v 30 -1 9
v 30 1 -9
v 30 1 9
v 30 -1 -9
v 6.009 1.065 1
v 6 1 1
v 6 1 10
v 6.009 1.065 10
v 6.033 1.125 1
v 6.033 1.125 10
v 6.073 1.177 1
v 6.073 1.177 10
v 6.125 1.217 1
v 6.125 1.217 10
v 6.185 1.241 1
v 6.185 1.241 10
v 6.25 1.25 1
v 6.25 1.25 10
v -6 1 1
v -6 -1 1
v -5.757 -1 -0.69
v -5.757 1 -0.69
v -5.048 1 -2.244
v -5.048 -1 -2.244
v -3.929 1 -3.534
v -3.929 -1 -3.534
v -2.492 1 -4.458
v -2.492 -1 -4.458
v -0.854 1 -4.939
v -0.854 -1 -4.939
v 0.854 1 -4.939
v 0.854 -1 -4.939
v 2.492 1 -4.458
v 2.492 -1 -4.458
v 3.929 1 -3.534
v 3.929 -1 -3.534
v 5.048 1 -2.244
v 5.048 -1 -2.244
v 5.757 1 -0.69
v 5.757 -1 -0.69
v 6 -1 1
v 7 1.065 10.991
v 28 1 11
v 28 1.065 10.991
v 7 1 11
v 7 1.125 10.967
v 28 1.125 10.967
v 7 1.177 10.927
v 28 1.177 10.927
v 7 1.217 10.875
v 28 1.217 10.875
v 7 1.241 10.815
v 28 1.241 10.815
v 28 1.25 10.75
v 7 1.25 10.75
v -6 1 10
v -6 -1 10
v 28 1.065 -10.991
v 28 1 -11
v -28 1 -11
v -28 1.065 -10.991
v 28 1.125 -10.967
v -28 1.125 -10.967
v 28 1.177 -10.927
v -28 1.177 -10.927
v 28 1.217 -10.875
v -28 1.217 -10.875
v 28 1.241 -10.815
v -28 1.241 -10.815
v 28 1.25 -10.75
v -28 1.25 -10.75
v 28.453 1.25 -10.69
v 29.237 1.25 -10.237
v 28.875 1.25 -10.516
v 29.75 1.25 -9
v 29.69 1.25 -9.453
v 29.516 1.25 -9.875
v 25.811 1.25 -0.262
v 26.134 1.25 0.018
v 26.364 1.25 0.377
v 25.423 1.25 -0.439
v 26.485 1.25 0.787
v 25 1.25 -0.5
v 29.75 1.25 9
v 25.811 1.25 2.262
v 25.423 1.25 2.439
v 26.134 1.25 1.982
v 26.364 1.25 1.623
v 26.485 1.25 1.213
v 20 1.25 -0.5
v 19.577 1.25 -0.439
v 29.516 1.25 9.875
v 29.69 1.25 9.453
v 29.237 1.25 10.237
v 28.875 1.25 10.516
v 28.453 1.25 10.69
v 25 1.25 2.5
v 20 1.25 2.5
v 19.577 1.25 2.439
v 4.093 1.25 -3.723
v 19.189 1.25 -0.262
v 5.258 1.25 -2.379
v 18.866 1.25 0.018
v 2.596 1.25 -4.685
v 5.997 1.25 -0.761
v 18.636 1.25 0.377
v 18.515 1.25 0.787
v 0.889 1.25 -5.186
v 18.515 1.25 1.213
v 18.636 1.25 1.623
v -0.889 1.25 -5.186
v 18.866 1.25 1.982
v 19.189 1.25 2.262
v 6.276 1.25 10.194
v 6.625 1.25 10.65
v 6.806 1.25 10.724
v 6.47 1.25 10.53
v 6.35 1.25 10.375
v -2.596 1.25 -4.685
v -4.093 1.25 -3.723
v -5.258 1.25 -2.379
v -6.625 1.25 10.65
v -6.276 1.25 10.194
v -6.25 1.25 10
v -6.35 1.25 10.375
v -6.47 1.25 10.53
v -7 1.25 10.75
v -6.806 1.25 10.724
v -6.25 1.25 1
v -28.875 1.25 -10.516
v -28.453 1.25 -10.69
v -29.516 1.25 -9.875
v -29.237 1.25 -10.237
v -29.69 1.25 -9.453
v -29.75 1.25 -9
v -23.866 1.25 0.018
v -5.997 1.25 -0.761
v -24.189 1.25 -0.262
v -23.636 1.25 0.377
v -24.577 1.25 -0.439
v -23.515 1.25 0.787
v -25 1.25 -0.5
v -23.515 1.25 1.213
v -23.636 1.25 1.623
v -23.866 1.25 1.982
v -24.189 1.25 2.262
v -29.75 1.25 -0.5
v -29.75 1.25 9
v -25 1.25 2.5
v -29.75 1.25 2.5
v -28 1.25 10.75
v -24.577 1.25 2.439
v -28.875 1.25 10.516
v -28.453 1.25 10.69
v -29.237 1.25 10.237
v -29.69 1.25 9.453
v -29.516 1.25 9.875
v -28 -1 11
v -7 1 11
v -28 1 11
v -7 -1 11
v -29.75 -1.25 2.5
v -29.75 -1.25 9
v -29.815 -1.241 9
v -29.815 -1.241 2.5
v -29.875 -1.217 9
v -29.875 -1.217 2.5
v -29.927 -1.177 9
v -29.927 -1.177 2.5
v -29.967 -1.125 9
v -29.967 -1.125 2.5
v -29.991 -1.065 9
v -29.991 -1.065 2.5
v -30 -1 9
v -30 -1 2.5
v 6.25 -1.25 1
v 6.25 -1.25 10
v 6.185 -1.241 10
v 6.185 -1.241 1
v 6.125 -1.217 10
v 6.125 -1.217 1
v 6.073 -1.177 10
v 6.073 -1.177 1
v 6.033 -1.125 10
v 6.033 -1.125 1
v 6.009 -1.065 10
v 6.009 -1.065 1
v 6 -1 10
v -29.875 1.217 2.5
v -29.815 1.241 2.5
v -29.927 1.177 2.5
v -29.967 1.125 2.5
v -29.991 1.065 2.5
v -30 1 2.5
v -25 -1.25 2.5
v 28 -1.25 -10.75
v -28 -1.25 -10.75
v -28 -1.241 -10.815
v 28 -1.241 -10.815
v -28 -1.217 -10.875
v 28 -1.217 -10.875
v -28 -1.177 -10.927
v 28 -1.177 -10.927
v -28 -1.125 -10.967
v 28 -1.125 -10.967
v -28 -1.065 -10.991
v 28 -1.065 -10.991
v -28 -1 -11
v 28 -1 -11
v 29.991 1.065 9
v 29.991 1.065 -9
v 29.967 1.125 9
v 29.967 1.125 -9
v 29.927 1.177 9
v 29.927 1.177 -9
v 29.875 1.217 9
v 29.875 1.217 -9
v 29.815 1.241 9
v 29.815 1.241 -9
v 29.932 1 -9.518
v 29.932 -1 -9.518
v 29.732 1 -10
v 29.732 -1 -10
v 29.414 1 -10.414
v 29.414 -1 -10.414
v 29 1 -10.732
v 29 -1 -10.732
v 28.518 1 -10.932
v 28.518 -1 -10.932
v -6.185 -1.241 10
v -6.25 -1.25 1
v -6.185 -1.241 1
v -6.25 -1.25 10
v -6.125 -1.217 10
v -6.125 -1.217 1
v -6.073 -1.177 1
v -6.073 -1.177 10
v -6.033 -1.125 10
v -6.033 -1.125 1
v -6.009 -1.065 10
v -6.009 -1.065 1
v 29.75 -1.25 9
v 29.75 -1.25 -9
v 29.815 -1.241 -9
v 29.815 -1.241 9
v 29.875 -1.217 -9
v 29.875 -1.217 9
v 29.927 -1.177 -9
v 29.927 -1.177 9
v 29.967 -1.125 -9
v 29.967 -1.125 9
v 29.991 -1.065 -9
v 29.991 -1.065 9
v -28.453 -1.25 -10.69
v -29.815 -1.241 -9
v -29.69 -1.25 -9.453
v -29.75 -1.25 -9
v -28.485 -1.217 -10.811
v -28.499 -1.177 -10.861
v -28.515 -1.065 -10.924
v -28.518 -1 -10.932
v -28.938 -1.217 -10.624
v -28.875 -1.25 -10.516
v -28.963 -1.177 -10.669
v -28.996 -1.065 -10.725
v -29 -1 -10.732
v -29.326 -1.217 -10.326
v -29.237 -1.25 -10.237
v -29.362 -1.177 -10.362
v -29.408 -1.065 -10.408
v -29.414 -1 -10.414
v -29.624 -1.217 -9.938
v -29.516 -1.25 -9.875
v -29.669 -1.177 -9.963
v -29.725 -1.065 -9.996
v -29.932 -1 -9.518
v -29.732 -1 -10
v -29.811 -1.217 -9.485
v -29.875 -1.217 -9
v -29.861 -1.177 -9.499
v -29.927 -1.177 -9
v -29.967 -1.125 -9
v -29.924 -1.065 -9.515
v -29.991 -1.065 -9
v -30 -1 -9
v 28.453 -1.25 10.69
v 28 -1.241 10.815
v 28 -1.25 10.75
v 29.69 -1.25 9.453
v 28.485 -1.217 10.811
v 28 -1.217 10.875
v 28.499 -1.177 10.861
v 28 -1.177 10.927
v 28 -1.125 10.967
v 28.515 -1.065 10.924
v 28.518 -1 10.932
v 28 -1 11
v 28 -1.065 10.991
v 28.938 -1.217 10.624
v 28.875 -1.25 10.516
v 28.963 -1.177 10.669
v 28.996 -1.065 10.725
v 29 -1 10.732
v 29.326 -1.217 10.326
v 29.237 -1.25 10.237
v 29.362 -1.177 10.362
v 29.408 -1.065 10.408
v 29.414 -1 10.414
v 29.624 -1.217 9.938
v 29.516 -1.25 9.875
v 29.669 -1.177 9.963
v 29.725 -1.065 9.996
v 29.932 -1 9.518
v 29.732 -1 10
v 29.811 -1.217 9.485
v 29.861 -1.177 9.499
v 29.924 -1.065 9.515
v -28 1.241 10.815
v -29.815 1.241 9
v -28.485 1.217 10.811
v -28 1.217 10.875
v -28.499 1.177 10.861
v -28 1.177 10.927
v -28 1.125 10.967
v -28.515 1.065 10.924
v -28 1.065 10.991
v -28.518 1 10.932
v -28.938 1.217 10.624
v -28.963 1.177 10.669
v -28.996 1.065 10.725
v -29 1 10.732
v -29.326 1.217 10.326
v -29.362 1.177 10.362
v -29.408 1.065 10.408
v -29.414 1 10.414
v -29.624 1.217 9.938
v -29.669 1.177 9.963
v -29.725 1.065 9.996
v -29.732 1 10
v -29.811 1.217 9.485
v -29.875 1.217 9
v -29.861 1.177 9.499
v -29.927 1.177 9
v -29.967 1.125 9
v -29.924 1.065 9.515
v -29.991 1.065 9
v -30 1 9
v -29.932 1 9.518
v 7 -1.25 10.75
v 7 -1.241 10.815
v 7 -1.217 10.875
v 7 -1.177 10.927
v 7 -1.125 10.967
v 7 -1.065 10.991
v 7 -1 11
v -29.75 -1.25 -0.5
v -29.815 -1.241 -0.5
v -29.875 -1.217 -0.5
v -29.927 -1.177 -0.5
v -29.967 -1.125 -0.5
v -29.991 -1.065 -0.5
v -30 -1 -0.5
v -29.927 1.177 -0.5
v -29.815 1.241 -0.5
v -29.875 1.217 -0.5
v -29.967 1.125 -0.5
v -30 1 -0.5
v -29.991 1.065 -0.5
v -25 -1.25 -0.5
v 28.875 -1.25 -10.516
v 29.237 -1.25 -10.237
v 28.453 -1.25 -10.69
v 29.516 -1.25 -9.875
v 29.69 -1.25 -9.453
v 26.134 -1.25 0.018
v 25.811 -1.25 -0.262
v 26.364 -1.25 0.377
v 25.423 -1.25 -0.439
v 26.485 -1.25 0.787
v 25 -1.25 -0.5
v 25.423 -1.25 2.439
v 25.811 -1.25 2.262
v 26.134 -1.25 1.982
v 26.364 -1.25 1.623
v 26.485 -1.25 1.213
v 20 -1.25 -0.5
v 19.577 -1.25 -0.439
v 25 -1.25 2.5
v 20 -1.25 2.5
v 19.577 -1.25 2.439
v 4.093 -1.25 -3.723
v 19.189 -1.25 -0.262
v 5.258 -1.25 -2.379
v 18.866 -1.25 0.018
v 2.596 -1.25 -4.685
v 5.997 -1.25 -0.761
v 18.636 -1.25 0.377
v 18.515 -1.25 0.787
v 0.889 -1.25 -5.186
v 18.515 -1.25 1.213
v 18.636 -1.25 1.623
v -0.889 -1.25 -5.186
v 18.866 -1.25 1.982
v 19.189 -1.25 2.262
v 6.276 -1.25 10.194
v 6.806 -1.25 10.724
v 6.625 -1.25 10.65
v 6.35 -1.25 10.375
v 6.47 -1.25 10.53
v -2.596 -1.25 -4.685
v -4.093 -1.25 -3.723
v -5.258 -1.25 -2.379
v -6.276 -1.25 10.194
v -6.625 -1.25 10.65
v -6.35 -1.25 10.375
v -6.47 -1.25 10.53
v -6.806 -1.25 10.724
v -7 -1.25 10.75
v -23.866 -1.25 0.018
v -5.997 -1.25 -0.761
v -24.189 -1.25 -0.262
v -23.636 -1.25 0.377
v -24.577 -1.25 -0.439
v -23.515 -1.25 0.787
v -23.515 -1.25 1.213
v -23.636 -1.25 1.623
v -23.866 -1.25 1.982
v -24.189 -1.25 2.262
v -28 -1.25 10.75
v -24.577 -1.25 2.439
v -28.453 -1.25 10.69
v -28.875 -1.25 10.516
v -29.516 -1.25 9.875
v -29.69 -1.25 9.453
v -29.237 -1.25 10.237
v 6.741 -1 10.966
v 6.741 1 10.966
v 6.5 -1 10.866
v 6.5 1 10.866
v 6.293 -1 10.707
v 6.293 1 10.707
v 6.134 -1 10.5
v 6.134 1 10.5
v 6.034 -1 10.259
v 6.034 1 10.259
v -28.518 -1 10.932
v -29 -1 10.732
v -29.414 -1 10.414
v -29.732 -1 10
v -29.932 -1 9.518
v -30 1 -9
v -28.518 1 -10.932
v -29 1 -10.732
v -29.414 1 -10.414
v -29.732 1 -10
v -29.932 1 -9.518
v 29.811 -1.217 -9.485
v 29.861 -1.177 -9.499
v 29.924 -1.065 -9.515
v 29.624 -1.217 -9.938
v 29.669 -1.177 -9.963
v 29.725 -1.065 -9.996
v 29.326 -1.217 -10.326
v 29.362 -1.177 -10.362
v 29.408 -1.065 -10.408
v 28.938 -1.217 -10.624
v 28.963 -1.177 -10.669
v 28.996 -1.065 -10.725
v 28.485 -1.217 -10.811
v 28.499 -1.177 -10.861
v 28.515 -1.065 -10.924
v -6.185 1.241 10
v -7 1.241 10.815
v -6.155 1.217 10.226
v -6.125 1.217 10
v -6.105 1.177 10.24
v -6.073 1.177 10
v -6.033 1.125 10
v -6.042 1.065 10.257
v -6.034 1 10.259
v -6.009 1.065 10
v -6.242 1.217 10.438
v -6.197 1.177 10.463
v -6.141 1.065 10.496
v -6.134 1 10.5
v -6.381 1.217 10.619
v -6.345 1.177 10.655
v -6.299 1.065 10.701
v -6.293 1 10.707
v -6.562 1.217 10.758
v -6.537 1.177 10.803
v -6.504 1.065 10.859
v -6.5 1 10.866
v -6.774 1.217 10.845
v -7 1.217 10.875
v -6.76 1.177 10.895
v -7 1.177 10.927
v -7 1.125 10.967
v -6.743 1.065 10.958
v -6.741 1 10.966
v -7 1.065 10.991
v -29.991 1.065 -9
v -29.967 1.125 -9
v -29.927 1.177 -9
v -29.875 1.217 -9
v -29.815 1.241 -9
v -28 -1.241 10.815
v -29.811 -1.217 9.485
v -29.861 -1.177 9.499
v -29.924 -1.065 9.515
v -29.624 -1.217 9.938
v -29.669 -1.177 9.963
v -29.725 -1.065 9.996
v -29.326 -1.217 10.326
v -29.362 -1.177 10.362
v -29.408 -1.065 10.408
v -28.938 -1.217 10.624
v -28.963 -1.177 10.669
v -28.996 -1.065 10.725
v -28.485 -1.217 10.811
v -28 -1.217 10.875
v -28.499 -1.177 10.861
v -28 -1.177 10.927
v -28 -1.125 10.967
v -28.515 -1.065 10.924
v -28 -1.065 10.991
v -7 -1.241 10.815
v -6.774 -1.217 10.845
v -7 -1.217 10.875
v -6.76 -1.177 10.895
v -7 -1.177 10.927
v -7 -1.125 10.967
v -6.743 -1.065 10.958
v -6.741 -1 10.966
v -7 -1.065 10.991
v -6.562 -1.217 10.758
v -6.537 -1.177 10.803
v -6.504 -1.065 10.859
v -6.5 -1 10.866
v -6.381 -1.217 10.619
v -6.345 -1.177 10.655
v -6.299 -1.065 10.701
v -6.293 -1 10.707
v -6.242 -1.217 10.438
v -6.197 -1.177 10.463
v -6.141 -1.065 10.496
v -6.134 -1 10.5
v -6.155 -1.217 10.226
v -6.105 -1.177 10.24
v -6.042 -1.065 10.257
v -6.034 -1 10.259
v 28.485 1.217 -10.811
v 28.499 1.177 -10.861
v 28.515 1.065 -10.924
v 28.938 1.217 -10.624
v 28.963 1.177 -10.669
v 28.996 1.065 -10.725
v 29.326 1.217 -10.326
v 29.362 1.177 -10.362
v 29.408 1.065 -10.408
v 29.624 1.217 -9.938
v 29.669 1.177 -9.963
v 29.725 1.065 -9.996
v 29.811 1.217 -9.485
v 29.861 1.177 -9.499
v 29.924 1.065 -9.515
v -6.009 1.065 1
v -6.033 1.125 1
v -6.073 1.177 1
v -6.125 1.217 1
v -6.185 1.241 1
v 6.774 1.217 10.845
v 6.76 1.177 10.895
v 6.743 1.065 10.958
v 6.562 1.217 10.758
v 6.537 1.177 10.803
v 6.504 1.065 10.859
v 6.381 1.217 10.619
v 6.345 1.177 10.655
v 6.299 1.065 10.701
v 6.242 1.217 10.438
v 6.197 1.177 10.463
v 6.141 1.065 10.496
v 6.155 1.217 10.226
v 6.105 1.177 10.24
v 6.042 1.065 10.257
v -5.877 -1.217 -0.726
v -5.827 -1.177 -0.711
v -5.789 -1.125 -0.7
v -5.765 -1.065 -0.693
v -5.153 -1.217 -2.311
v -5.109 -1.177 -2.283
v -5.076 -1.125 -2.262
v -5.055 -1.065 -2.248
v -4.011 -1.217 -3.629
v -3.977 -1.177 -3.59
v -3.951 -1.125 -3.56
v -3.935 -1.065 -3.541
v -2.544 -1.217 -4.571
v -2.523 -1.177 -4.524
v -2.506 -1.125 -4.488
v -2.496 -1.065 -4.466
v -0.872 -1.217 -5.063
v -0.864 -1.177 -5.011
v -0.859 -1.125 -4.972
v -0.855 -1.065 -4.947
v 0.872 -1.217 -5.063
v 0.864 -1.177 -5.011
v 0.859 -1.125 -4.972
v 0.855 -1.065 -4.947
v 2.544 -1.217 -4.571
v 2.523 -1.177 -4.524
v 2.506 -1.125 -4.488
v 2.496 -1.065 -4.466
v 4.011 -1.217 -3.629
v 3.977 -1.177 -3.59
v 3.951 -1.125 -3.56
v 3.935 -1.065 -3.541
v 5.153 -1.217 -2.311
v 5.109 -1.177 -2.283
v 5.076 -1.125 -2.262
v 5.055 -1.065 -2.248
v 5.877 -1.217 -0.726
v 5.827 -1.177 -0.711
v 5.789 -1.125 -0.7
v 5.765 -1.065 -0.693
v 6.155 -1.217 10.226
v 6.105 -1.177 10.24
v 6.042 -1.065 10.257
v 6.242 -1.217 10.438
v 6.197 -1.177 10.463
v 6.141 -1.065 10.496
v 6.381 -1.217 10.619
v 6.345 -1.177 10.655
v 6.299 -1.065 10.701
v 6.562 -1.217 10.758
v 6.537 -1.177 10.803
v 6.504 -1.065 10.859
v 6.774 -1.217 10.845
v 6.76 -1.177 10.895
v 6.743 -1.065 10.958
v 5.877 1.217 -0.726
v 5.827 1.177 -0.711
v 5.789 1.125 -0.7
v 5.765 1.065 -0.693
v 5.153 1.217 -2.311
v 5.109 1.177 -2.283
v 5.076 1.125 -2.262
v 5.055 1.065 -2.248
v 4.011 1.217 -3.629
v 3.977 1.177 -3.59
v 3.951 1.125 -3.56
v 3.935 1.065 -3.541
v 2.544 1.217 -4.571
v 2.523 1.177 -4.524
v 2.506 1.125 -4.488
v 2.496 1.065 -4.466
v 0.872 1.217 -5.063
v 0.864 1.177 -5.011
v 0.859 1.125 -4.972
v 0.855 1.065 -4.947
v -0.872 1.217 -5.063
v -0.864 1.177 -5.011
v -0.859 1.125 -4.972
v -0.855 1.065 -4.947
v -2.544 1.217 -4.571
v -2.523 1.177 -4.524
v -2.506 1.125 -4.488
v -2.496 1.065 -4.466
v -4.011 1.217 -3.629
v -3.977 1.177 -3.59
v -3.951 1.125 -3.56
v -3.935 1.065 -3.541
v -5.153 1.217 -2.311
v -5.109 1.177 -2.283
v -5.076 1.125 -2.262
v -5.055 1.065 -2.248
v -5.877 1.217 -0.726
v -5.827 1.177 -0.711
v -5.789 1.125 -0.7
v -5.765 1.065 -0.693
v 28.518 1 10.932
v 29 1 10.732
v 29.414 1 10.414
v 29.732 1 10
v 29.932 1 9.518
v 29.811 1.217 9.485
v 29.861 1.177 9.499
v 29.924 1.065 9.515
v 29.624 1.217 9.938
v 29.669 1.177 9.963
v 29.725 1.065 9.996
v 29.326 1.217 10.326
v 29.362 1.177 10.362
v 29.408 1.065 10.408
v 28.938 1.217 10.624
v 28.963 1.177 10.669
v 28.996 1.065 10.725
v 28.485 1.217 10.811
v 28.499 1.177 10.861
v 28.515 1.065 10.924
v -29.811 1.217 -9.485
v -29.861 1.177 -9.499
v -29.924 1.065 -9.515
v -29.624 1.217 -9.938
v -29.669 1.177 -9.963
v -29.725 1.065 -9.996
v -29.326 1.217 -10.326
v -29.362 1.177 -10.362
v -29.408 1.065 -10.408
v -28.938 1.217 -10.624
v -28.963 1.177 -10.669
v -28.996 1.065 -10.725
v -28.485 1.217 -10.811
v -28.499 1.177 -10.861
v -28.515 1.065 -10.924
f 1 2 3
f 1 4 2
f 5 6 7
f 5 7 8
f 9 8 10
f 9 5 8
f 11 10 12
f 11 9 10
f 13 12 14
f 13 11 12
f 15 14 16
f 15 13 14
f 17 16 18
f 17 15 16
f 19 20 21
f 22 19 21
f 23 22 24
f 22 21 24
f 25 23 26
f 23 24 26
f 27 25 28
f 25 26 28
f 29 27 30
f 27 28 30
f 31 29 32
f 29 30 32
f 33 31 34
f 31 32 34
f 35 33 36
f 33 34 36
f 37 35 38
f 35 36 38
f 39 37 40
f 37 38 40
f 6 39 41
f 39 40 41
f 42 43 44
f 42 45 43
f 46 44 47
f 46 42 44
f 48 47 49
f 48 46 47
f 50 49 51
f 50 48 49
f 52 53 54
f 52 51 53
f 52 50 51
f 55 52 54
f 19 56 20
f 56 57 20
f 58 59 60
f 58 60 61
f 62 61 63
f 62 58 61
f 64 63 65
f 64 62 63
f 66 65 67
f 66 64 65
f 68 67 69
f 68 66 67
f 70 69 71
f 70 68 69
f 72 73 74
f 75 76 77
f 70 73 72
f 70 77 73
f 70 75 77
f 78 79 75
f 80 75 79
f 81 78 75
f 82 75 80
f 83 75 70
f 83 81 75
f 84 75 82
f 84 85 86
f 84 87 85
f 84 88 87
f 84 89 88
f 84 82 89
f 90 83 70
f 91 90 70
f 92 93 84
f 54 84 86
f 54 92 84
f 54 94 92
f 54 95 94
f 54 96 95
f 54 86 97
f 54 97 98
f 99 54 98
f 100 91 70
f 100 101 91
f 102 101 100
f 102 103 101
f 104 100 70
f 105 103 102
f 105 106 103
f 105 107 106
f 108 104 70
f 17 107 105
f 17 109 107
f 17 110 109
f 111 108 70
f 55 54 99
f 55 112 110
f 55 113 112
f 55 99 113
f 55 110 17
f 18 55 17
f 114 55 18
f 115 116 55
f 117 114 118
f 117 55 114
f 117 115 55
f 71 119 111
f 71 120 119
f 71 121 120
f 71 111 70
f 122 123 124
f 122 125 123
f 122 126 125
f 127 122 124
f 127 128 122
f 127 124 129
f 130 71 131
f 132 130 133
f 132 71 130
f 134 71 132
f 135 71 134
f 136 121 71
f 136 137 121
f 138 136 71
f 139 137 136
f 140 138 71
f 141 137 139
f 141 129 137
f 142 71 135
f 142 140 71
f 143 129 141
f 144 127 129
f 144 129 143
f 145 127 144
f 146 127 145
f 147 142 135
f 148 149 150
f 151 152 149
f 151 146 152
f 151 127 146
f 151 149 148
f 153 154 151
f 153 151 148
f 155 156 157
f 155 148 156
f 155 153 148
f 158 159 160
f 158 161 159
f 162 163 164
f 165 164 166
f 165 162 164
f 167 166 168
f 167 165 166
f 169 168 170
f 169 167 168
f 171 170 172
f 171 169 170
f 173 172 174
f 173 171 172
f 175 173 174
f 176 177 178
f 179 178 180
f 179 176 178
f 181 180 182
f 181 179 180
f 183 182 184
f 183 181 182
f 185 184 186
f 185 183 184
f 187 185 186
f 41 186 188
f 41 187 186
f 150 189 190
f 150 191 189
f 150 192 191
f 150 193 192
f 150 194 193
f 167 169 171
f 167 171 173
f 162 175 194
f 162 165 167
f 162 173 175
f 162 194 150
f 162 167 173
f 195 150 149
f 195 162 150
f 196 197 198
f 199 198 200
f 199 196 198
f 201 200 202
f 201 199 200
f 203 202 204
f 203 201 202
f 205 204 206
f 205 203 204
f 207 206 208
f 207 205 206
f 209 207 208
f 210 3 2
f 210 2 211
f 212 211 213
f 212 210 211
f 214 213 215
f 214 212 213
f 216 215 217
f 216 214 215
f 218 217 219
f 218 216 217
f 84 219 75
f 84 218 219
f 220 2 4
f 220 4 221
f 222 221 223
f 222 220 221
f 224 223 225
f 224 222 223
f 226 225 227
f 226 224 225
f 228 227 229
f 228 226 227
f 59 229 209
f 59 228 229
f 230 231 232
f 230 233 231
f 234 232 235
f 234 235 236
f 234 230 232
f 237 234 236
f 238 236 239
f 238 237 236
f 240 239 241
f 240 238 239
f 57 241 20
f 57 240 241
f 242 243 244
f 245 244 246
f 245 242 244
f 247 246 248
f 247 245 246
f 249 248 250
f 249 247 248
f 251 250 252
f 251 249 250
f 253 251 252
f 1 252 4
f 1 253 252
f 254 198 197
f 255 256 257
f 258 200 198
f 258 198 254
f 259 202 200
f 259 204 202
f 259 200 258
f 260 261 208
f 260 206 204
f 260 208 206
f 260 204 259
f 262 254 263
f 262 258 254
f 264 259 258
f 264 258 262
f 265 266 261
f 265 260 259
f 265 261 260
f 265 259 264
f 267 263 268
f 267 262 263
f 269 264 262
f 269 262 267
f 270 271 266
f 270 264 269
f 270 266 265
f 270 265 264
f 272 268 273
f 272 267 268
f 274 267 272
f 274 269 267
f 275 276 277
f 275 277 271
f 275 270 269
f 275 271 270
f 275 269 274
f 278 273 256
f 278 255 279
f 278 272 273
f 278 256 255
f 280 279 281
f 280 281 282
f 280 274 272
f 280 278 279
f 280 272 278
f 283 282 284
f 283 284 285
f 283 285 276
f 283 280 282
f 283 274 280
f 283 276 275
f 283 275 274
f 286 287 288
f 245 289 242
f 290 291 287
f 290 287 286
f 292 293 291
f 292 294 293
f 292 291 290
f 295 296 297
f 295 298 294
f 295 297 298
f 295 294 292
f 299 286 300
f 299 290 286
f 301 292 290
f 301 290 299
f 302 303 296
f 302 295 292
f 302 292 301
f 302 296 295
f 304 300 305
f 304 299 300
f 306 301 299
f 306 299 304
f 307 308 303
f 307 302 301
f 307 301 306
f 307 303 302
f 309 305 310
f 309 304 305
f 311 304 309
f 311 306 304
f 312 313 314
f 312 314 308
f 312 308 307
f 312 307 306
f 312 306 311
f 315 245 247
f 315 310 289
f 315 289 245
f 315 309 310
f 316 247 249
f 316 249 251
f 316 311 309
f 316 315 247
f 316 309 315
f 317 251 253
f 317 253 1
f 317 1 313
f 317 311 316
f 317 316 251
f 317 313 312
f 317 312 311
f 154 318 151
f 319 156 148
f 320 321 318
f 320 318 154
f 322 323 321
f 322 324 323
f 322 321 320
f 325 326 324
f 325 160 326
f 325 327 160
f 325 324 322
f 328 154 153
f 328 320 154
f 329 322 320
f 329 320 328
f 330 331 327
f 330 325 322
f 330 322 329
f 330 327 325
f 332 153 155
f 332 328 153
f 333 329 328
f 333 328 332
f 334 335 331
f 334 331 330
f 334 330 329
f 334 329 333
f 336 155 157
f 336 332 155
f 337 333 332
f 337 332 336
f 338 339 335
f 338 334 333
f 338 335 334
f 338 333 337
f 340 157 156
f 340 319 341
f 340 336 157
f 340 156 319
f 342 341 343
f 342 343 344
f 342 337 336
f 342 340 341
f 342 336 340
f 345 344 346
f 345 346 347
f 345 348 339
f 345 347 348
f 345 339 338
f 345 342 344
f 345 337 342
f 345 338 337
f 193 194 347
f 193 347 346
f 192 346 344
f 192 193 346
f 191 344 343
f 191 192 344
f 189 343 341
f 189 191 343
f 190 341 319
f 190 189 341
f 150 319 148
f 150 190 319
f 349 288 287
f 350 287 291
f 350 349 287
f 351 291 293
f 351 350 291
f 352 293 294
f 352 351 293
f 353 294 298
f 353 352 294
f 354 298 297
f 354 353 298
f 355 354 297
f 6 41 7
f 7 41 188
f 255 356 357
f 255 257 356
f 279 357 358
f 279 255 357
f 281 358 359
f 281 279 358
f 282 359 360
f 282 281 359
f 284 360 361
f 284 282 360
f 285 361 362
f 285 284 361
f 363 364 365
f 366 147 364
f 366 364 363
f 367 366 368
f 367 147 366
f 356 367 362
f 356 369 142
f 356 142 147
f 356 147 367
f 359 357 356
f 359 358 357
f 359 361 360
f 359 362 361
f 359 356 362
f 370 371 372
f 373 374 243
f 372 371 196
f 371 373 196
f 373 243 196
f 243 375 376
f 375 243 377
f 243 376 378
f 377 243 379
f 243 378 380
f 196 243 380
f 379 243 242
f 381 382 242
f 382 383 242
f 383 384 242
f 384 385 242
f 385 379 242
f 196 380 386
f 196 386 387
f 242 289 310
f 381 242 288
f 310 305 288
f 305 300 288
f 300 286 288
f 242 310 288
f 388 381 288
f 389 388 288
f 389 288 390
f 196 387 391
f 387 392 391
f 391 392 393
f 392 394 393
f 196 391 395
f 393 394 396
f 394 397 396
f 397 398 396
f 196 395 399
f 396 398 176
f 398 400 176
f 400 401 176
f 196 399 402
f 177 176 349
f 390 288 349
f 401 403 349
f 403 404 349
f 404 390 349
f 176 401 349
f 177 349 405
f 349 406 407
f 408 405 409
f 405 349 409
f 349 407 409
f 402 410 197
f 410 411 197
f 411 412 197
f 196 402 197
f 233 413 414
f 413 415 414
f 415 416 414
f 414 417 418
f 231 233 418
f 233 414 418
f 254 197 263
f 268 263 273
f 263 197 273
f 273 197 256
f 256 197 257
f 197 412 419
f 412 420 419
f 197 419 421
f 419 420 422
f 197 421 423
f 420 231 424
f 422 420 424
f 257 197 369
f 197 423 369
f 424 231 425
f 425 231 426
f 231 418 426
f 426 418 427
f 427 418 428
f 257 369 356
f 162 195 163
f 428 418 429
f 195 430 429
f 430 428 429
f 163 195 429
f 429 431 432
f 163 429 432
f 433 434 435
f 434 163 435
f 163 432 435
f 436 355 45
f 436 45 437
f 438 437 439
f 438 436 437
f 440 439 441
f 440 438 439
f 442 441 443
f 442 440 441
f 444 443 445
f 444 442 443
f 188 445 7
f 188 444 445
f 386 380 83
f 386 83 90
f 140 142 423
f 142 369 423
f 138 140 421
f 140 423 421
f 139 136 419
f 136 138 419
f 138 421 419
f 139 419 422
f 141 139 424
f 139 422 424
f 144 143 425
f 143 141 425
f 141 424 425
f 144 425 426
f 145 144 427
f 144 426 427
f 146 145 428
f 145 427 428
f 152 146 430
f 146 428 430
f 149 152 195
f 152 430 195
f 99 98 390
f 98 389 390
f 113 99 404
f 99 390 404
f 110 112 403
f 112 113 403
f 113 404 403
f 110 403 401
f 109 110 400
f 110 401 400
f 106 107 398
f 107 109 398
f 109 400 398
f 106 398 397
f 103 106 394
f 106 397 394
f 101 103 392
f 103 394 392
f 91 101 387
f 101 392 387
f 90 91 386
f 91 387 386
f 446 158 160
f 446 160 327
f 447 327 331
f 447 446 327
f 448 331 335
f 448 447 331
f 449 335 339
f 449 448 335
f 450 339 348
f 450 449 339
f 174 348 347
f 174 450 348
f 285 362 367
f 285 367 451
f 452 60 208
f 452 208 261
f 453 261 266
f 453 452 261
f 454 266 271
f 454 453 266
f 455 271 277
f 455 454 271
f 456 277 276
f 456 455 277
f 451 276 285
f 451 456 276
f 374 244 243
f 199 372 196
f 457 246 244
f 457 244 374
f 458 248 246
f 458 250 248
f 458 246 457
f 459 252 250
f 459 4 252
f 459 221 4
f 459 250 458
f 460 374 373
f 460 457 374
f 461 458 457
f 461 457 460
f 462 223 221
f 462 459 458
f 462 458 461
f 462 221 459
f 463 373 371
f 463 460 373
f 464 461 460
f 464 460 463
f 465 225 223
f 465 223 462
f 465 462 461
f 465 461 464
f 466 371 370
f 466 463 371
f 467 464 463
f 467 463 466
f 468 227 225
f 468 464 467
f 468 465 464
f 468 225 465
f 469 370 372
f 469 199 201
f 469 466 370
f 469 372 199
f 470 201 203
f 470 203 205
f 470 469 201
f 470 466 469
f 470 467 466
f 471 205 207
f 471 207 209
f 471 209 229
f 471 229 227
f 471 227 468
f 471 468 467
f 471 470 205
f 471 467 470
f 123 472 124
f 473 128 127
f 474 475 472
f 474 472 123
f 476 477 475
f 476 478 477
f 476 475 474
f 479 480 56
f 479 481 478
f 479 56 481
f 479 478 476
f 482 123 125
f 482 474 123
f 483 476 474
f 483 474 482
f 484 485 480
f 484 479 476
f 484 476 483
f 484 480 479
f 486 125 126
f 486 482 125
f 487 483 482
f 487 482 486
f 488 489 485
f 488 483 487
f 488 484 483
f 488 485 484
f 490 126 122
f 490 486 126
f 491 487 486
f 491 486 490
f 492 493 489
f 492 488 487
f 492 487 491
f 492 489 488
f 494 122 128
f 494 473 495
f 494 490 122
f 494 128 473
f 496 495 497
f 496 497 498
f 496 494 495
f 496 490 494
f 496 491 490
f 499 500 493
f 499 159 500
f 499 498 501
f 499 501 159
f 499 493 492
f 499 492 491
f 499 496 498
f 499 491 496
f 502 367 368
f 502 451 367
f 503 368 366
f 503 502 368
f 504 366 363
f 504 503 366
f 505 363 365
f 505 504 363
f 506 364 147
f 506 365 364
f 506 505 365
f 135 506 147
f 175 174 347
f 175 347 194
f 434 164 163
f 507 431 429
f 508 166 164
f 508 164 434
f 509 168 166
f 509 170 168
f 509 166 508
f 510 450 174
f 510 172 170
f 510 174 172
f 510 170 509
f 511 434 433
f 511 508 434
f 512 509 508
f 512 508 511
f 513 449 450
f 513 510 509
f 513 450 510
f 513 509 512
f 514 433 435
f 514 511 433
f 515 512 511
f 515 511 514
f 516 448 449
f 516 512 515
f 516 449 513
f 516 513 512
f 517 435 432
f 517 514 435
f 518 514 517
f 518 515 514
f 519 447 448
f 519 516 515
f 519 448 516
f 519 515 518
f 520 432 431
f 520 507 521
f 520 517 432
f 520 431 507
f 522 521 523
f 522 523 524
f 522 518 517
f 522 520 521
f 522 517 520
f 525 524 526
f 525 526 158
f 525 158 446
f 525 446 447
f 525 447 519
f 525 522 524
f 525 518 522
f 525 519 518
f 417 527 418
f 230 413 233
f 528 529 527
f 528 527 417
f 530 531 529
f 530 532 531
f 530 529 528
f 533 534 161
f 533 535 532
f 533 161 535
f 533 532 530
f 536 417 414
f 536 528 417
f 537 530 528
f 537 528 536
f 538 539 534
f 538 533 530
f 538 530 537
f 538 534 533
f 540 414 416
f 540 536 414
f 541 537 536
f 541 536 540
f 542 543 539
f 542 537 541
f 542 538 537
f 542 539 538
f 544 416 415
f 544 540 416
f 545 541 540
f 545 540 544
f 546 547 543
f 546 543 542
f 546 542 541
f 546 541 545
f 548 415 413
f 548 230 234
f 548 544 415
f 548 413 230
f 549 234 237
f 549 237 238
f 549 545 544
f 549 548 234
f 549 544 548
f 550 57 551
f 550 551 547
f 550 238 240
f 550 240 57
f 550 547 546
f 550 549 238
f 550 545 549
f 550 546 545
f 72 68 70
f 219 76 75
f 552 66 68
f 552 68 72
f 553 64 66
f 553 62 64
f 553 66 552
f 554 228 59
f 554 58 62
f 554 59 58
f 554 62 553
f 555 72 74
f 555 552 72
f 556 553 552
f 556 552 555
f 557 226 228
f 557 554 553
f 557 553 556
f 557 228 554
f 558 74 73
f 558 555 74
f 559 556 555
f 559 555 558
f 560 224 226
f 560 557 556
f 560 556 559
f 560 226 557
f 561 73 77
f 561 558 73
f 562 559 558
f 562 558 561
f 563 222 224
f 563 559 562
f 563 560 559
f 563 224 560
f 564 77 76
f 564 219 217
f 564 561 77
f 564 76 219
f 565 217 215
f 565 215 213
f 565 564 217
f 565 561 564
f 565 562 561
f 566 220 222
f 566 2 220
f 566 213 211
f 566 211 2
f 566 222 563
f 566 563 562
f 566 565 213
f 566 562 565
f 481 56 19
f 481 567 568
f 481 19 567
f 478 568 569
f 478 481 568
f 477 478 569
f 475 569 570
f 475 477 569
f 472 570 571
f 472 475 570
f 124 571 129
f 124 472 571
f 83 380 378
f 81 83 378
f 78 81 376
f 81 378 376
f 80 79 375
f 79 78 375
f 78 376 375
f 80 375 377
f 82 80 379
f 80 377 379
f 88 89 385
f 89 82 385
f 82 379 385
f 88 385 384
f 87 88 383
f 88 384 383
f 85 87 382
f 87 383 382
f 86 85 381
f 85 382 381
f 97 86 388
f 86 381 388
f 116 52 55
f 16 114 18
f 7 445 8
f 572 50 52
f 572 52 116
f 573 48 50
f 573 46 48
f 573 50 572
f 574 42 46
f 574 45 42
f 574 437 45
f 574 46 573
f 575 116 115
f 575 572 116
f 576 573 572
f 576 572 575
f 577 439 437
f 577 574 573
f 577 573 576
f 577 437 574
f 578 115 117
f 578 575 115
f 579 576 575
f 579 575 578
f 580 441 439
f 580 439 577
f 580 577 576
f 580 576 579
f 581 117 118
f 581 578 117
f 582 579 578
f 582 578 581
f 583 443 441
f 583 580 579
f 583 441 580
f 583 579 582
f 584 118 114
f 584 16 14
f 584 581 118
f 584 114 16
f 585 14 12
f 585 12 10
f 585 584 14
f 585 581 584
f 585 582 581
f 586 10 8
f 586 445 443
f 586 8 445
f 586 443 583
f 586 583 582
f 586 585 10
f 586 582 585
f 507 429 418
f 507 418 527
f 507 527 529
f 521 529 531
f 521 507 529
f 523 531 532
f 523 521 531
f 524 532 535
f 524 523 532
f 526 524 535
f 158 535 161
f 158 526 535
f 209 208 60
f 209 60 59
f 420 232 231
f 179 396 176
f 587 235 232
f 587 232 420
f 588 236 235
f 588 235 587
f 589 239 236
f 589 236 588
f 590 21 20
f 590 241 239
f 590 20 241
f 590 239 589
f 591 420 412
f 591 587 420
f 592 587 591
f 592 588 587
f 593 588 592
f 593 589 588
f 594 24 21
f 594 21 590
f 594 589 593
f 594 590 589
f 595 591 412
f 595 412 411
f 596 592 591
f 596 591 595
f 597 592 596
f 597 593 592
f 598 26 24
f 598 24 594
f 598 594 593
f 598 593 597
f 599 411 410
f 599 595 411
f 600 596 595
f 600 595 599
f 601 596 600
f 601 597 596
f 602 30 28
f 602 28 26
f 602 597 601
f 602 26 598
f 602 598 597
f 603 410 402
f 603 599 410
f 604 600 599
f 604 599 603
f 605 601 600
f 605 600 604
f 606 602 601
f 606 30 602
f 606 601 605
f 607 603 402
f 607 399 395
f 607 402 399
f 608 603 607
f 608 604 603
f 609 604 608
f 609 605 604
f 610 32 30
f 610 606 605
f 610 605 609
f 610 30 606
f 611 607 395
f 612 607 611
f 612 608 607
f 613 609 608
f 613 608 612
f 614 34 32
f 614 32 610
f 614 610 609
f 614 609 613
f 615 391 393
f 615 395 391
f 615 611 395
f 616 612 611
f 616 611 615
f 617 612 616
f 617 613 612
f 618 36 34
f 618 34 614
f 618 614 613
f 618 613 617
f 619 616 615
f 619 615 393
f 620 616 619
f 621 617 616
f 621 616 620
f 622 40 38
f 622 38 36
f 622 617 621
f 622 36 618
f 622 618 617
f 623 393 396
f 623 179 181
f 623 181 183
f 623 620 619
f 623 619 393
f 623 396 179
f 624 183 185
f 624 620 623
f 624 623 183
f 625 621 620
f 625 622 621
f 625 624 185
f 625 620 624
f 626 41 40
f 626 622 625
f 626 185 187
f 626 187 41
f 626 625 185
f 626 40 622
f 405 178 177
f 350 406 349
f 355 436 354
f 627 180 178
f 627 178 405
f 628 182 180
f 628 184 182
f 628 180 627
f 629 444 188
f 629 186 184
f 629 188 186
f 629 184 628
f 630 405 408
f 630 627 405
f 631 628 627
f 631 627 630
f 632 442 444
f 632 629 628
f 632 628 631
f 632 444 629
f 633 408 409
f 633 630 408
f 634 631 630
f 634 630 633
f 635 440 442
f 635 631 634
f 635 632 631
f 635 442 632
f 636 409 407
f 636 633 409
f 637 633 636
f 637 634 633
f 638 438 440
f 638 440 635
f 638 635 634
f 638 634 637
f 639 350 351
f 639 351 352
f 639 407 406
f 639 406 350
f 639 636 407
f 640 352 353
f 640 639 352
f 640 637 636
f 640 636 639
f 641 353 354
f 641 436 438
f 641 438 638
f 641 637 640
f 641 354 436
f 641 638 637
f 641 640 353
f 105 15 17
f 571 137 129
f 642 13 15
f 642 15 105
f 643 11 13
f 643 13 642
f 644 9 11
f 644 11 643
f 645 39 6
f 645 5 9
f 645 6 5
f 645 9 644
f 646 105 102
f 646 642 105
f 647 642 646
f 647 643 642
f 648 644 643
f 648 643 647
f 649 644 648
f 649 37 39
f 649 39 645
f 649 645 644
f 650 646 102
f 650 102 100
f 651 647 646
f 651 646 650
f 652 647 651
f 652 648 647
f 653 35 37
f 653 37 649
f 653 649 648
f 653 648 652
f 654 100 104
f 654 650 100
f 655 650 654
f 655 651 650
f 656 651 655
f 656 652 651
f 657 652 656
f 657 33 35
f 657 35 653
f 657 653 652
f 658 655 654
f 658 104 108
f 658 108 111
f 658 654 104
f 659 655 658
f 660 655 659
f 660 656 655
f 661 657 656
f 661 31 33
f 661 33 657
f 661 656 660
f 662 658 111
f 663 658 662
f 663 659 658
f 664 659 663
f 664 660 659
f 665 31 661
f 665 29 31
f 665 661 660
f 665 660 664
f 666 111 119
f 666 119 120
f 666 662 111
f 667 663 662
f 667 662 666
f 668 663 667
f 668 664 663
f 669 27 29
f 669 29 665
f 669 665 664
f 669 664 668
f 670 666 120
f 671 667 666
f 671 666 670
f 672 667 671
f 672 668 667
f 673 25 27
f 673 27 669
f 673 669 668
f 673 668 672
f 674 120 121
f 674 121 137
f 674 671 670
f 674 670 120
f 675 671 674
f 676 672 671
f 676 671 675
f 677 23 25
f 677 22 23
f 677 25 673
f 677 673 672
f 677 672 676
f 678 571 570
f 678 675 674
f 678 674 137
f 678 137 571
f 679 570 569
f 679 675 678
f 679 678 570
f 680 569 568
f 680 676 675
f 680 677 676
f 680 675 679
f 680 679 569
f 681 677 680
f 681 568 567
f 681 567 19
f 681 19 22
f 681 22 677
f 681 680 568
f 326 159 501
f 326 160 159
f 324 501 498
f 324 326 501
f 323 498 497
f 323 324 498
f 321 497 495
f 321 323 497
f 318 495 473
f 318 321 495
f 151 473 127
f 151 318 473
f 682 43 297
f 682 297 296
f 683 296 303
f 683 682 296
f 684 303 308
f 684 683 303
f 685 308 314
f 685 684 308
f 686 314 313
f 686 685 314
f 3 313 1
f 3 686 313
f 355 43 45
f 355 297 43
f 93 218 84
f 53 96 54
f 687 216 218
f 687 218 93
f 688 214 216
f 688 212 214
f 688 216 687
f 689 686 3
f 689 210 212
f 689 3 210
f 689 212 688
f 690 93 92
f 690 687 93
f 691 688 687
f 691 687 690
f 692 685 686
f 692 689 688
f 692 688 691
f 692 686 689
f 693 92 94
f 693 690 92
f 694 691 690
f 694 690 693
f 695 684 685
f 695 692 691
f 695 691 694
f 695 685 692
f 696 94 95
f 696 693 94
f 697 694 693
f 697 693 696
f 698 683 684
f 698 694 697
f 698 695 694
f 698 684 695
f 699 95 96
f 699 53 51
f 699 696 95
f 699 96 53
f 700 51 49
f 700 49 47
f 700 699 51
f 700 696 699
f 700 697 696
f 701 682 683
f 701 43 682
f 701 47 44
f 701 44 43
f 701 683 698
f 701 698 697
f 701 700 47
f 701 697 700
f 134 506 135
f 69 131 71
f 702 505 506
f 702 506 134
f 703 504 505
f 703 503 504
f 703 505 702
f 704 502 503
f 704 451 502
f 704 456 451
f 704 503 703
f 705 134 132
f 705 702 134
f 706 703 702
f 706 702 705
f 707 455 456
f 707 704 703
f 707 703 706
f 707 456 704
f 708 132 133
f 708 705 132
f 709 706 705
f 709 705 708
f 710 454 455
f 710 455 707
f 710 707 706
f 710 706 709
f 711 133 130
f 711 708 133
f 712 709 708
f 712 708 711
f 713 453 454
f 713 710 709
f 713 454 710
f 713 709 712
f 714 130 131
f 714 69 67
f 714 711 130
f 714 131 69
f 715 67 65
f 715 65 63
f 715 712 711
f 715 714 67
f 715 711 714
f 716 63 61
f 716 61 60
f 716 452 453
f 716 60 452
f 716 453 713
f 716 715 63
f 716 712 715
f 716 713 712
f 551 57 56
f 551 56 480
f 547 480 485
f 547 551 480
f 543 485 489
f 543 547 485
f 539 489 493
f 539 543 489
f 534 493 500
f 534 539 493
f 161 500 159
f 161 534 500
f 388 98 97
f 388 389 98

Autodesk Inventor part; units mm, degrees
ref_plane "YZ Plane" through (0, 0, 0) normal (1, 0, 0) x (0, 1, 0)
ref_plane "XZ Plane" through (0, 0, 0) normal (0, 1, 0) x (-1, 0, 0)
ref_plane "XY Plane" through (0, 0, 0) normal (0, 0, 1) x (1, 0, 0)
sketch "Sketch1" plane through (0, 0, 0) normal (0, 1, 0) x (-1, 0, 0)
  line L0 (-30, 11) -> (-6, 11)
  line L1 (30, 11) -> (30, 2.5)
  line L2 (30, -11) -> (-30, -11)
  line L3 (-30, -11) -> (-30, 11)
  line L4 (-30, 11) -> (30, -11) construction
  line L5 (30, 11) -> (-30, -11) construction
  line L6 (6, 11) -> (6, 1)
  line L7 (-6, 1) -> (-6, 11)
  arc A0 (-6, 1) -> (6, 1) centre (0, 1) ccw
  line L8 (-20, 1) -> (-25, 1) construction
  line L9 (-20, 2.5) -> (-25, 2.5)
  line L10 (-25, -0.5) -> (-20, -0.5)
  arc A1 (-20, -0.5) -> (-20, 2.5) centre (-20, 1) ccw
  arc A2 (-25, 2.5) -> (-25, -0.5) centre (-25, 1) ccw
  line L11 (30, 1) -> (25, 1) construction
  line L12 (30, 2.5) -> (25, 2.5)
  line L13 (25, -0.5) -> (30, -0.5)
  arc A3 (30, -0.5) -> (30, 2.5) centre (30, 1) ccw construction
  arc A4 (25, 2.5) -> (25, -0.5) centre (25, 1) ccw
  line L14 (30, -0.5) -> (30, -11)
  line L15 (30, 2.5) -> (30, -0.5) construction
  line L16 (6, 11) -> (30, 11)
  line L17 (-6, 11) -> (6, 11) construction
  point P0 (0, 0)
  point P1 (0, 0)
  point P2 (0, 0)
  point P3 (-22.5, 1)
  point P4 (27.5, 1)
  dimension "d0" = 60
  dimension "d1" = 22
  dimension "d3" = 1
  dimension "d4" = 12
  dimension "d5" = 5
  dimension "d6" = 3
  dimension "d7" = 10
  dimension "d8" = 5
  dimension "d9" = 5
extrude "Extrusion1" add sketch "Sketch1" along normal mid plane 2.5
fillet "Fillet1" radius 2 4 edges at (-30, 0, -11) (-30, 0, 11) (30, 0, -11) (30, 0, 11)
fillet "Fillet1" radius 1 2 edges at (-6, 0, 11) (6, 0, 11)
fillet "Fillet2" radius 0.25 30 edges at (0, 1.25, -5) (6, 1.25, 5.5) (6.2929, 1.25, 10.7071) (17.5, 1.25, 11) (29.4142, 1.25, 10.4142) (30, 1.25, 0) (29.4142, 1.25, -10.4142) (0, 1.25, -11) (-29.4142, 1.25, -10.4142) (-30, 1.25, -4.75) (-6.2929, 1.25, 10.7071) (-17.5, 1.25, 11) (-29.4142, 1.25, 10.4142) (-30, 1.25, 5.75) (-6, 1.25, 5.5) (-6.2929, -1.25, 10.7071) (-17.5, -1.25, 11) (-29.4142, -1.25, 10.4142) (-30, -1.25, 5.75) (0, -1.25, -5) (6, -1.25, 5.5) (6.2929, -1.25, 10.7071) (17.5, -1.25, 11) (29.4142, -1.25, 10.4142) (30, -1.25, 0) (29.4142, -1.25, -10.4142) (0, -1.25, -11) (-29.4142, -1.25, -10.4142) (-30, -1.25, -4.75) (-6, -1.25, 5.5)
equation "\"d8\" = d5"
properties part number "Extruder Plate" material "Stainless Steel"
